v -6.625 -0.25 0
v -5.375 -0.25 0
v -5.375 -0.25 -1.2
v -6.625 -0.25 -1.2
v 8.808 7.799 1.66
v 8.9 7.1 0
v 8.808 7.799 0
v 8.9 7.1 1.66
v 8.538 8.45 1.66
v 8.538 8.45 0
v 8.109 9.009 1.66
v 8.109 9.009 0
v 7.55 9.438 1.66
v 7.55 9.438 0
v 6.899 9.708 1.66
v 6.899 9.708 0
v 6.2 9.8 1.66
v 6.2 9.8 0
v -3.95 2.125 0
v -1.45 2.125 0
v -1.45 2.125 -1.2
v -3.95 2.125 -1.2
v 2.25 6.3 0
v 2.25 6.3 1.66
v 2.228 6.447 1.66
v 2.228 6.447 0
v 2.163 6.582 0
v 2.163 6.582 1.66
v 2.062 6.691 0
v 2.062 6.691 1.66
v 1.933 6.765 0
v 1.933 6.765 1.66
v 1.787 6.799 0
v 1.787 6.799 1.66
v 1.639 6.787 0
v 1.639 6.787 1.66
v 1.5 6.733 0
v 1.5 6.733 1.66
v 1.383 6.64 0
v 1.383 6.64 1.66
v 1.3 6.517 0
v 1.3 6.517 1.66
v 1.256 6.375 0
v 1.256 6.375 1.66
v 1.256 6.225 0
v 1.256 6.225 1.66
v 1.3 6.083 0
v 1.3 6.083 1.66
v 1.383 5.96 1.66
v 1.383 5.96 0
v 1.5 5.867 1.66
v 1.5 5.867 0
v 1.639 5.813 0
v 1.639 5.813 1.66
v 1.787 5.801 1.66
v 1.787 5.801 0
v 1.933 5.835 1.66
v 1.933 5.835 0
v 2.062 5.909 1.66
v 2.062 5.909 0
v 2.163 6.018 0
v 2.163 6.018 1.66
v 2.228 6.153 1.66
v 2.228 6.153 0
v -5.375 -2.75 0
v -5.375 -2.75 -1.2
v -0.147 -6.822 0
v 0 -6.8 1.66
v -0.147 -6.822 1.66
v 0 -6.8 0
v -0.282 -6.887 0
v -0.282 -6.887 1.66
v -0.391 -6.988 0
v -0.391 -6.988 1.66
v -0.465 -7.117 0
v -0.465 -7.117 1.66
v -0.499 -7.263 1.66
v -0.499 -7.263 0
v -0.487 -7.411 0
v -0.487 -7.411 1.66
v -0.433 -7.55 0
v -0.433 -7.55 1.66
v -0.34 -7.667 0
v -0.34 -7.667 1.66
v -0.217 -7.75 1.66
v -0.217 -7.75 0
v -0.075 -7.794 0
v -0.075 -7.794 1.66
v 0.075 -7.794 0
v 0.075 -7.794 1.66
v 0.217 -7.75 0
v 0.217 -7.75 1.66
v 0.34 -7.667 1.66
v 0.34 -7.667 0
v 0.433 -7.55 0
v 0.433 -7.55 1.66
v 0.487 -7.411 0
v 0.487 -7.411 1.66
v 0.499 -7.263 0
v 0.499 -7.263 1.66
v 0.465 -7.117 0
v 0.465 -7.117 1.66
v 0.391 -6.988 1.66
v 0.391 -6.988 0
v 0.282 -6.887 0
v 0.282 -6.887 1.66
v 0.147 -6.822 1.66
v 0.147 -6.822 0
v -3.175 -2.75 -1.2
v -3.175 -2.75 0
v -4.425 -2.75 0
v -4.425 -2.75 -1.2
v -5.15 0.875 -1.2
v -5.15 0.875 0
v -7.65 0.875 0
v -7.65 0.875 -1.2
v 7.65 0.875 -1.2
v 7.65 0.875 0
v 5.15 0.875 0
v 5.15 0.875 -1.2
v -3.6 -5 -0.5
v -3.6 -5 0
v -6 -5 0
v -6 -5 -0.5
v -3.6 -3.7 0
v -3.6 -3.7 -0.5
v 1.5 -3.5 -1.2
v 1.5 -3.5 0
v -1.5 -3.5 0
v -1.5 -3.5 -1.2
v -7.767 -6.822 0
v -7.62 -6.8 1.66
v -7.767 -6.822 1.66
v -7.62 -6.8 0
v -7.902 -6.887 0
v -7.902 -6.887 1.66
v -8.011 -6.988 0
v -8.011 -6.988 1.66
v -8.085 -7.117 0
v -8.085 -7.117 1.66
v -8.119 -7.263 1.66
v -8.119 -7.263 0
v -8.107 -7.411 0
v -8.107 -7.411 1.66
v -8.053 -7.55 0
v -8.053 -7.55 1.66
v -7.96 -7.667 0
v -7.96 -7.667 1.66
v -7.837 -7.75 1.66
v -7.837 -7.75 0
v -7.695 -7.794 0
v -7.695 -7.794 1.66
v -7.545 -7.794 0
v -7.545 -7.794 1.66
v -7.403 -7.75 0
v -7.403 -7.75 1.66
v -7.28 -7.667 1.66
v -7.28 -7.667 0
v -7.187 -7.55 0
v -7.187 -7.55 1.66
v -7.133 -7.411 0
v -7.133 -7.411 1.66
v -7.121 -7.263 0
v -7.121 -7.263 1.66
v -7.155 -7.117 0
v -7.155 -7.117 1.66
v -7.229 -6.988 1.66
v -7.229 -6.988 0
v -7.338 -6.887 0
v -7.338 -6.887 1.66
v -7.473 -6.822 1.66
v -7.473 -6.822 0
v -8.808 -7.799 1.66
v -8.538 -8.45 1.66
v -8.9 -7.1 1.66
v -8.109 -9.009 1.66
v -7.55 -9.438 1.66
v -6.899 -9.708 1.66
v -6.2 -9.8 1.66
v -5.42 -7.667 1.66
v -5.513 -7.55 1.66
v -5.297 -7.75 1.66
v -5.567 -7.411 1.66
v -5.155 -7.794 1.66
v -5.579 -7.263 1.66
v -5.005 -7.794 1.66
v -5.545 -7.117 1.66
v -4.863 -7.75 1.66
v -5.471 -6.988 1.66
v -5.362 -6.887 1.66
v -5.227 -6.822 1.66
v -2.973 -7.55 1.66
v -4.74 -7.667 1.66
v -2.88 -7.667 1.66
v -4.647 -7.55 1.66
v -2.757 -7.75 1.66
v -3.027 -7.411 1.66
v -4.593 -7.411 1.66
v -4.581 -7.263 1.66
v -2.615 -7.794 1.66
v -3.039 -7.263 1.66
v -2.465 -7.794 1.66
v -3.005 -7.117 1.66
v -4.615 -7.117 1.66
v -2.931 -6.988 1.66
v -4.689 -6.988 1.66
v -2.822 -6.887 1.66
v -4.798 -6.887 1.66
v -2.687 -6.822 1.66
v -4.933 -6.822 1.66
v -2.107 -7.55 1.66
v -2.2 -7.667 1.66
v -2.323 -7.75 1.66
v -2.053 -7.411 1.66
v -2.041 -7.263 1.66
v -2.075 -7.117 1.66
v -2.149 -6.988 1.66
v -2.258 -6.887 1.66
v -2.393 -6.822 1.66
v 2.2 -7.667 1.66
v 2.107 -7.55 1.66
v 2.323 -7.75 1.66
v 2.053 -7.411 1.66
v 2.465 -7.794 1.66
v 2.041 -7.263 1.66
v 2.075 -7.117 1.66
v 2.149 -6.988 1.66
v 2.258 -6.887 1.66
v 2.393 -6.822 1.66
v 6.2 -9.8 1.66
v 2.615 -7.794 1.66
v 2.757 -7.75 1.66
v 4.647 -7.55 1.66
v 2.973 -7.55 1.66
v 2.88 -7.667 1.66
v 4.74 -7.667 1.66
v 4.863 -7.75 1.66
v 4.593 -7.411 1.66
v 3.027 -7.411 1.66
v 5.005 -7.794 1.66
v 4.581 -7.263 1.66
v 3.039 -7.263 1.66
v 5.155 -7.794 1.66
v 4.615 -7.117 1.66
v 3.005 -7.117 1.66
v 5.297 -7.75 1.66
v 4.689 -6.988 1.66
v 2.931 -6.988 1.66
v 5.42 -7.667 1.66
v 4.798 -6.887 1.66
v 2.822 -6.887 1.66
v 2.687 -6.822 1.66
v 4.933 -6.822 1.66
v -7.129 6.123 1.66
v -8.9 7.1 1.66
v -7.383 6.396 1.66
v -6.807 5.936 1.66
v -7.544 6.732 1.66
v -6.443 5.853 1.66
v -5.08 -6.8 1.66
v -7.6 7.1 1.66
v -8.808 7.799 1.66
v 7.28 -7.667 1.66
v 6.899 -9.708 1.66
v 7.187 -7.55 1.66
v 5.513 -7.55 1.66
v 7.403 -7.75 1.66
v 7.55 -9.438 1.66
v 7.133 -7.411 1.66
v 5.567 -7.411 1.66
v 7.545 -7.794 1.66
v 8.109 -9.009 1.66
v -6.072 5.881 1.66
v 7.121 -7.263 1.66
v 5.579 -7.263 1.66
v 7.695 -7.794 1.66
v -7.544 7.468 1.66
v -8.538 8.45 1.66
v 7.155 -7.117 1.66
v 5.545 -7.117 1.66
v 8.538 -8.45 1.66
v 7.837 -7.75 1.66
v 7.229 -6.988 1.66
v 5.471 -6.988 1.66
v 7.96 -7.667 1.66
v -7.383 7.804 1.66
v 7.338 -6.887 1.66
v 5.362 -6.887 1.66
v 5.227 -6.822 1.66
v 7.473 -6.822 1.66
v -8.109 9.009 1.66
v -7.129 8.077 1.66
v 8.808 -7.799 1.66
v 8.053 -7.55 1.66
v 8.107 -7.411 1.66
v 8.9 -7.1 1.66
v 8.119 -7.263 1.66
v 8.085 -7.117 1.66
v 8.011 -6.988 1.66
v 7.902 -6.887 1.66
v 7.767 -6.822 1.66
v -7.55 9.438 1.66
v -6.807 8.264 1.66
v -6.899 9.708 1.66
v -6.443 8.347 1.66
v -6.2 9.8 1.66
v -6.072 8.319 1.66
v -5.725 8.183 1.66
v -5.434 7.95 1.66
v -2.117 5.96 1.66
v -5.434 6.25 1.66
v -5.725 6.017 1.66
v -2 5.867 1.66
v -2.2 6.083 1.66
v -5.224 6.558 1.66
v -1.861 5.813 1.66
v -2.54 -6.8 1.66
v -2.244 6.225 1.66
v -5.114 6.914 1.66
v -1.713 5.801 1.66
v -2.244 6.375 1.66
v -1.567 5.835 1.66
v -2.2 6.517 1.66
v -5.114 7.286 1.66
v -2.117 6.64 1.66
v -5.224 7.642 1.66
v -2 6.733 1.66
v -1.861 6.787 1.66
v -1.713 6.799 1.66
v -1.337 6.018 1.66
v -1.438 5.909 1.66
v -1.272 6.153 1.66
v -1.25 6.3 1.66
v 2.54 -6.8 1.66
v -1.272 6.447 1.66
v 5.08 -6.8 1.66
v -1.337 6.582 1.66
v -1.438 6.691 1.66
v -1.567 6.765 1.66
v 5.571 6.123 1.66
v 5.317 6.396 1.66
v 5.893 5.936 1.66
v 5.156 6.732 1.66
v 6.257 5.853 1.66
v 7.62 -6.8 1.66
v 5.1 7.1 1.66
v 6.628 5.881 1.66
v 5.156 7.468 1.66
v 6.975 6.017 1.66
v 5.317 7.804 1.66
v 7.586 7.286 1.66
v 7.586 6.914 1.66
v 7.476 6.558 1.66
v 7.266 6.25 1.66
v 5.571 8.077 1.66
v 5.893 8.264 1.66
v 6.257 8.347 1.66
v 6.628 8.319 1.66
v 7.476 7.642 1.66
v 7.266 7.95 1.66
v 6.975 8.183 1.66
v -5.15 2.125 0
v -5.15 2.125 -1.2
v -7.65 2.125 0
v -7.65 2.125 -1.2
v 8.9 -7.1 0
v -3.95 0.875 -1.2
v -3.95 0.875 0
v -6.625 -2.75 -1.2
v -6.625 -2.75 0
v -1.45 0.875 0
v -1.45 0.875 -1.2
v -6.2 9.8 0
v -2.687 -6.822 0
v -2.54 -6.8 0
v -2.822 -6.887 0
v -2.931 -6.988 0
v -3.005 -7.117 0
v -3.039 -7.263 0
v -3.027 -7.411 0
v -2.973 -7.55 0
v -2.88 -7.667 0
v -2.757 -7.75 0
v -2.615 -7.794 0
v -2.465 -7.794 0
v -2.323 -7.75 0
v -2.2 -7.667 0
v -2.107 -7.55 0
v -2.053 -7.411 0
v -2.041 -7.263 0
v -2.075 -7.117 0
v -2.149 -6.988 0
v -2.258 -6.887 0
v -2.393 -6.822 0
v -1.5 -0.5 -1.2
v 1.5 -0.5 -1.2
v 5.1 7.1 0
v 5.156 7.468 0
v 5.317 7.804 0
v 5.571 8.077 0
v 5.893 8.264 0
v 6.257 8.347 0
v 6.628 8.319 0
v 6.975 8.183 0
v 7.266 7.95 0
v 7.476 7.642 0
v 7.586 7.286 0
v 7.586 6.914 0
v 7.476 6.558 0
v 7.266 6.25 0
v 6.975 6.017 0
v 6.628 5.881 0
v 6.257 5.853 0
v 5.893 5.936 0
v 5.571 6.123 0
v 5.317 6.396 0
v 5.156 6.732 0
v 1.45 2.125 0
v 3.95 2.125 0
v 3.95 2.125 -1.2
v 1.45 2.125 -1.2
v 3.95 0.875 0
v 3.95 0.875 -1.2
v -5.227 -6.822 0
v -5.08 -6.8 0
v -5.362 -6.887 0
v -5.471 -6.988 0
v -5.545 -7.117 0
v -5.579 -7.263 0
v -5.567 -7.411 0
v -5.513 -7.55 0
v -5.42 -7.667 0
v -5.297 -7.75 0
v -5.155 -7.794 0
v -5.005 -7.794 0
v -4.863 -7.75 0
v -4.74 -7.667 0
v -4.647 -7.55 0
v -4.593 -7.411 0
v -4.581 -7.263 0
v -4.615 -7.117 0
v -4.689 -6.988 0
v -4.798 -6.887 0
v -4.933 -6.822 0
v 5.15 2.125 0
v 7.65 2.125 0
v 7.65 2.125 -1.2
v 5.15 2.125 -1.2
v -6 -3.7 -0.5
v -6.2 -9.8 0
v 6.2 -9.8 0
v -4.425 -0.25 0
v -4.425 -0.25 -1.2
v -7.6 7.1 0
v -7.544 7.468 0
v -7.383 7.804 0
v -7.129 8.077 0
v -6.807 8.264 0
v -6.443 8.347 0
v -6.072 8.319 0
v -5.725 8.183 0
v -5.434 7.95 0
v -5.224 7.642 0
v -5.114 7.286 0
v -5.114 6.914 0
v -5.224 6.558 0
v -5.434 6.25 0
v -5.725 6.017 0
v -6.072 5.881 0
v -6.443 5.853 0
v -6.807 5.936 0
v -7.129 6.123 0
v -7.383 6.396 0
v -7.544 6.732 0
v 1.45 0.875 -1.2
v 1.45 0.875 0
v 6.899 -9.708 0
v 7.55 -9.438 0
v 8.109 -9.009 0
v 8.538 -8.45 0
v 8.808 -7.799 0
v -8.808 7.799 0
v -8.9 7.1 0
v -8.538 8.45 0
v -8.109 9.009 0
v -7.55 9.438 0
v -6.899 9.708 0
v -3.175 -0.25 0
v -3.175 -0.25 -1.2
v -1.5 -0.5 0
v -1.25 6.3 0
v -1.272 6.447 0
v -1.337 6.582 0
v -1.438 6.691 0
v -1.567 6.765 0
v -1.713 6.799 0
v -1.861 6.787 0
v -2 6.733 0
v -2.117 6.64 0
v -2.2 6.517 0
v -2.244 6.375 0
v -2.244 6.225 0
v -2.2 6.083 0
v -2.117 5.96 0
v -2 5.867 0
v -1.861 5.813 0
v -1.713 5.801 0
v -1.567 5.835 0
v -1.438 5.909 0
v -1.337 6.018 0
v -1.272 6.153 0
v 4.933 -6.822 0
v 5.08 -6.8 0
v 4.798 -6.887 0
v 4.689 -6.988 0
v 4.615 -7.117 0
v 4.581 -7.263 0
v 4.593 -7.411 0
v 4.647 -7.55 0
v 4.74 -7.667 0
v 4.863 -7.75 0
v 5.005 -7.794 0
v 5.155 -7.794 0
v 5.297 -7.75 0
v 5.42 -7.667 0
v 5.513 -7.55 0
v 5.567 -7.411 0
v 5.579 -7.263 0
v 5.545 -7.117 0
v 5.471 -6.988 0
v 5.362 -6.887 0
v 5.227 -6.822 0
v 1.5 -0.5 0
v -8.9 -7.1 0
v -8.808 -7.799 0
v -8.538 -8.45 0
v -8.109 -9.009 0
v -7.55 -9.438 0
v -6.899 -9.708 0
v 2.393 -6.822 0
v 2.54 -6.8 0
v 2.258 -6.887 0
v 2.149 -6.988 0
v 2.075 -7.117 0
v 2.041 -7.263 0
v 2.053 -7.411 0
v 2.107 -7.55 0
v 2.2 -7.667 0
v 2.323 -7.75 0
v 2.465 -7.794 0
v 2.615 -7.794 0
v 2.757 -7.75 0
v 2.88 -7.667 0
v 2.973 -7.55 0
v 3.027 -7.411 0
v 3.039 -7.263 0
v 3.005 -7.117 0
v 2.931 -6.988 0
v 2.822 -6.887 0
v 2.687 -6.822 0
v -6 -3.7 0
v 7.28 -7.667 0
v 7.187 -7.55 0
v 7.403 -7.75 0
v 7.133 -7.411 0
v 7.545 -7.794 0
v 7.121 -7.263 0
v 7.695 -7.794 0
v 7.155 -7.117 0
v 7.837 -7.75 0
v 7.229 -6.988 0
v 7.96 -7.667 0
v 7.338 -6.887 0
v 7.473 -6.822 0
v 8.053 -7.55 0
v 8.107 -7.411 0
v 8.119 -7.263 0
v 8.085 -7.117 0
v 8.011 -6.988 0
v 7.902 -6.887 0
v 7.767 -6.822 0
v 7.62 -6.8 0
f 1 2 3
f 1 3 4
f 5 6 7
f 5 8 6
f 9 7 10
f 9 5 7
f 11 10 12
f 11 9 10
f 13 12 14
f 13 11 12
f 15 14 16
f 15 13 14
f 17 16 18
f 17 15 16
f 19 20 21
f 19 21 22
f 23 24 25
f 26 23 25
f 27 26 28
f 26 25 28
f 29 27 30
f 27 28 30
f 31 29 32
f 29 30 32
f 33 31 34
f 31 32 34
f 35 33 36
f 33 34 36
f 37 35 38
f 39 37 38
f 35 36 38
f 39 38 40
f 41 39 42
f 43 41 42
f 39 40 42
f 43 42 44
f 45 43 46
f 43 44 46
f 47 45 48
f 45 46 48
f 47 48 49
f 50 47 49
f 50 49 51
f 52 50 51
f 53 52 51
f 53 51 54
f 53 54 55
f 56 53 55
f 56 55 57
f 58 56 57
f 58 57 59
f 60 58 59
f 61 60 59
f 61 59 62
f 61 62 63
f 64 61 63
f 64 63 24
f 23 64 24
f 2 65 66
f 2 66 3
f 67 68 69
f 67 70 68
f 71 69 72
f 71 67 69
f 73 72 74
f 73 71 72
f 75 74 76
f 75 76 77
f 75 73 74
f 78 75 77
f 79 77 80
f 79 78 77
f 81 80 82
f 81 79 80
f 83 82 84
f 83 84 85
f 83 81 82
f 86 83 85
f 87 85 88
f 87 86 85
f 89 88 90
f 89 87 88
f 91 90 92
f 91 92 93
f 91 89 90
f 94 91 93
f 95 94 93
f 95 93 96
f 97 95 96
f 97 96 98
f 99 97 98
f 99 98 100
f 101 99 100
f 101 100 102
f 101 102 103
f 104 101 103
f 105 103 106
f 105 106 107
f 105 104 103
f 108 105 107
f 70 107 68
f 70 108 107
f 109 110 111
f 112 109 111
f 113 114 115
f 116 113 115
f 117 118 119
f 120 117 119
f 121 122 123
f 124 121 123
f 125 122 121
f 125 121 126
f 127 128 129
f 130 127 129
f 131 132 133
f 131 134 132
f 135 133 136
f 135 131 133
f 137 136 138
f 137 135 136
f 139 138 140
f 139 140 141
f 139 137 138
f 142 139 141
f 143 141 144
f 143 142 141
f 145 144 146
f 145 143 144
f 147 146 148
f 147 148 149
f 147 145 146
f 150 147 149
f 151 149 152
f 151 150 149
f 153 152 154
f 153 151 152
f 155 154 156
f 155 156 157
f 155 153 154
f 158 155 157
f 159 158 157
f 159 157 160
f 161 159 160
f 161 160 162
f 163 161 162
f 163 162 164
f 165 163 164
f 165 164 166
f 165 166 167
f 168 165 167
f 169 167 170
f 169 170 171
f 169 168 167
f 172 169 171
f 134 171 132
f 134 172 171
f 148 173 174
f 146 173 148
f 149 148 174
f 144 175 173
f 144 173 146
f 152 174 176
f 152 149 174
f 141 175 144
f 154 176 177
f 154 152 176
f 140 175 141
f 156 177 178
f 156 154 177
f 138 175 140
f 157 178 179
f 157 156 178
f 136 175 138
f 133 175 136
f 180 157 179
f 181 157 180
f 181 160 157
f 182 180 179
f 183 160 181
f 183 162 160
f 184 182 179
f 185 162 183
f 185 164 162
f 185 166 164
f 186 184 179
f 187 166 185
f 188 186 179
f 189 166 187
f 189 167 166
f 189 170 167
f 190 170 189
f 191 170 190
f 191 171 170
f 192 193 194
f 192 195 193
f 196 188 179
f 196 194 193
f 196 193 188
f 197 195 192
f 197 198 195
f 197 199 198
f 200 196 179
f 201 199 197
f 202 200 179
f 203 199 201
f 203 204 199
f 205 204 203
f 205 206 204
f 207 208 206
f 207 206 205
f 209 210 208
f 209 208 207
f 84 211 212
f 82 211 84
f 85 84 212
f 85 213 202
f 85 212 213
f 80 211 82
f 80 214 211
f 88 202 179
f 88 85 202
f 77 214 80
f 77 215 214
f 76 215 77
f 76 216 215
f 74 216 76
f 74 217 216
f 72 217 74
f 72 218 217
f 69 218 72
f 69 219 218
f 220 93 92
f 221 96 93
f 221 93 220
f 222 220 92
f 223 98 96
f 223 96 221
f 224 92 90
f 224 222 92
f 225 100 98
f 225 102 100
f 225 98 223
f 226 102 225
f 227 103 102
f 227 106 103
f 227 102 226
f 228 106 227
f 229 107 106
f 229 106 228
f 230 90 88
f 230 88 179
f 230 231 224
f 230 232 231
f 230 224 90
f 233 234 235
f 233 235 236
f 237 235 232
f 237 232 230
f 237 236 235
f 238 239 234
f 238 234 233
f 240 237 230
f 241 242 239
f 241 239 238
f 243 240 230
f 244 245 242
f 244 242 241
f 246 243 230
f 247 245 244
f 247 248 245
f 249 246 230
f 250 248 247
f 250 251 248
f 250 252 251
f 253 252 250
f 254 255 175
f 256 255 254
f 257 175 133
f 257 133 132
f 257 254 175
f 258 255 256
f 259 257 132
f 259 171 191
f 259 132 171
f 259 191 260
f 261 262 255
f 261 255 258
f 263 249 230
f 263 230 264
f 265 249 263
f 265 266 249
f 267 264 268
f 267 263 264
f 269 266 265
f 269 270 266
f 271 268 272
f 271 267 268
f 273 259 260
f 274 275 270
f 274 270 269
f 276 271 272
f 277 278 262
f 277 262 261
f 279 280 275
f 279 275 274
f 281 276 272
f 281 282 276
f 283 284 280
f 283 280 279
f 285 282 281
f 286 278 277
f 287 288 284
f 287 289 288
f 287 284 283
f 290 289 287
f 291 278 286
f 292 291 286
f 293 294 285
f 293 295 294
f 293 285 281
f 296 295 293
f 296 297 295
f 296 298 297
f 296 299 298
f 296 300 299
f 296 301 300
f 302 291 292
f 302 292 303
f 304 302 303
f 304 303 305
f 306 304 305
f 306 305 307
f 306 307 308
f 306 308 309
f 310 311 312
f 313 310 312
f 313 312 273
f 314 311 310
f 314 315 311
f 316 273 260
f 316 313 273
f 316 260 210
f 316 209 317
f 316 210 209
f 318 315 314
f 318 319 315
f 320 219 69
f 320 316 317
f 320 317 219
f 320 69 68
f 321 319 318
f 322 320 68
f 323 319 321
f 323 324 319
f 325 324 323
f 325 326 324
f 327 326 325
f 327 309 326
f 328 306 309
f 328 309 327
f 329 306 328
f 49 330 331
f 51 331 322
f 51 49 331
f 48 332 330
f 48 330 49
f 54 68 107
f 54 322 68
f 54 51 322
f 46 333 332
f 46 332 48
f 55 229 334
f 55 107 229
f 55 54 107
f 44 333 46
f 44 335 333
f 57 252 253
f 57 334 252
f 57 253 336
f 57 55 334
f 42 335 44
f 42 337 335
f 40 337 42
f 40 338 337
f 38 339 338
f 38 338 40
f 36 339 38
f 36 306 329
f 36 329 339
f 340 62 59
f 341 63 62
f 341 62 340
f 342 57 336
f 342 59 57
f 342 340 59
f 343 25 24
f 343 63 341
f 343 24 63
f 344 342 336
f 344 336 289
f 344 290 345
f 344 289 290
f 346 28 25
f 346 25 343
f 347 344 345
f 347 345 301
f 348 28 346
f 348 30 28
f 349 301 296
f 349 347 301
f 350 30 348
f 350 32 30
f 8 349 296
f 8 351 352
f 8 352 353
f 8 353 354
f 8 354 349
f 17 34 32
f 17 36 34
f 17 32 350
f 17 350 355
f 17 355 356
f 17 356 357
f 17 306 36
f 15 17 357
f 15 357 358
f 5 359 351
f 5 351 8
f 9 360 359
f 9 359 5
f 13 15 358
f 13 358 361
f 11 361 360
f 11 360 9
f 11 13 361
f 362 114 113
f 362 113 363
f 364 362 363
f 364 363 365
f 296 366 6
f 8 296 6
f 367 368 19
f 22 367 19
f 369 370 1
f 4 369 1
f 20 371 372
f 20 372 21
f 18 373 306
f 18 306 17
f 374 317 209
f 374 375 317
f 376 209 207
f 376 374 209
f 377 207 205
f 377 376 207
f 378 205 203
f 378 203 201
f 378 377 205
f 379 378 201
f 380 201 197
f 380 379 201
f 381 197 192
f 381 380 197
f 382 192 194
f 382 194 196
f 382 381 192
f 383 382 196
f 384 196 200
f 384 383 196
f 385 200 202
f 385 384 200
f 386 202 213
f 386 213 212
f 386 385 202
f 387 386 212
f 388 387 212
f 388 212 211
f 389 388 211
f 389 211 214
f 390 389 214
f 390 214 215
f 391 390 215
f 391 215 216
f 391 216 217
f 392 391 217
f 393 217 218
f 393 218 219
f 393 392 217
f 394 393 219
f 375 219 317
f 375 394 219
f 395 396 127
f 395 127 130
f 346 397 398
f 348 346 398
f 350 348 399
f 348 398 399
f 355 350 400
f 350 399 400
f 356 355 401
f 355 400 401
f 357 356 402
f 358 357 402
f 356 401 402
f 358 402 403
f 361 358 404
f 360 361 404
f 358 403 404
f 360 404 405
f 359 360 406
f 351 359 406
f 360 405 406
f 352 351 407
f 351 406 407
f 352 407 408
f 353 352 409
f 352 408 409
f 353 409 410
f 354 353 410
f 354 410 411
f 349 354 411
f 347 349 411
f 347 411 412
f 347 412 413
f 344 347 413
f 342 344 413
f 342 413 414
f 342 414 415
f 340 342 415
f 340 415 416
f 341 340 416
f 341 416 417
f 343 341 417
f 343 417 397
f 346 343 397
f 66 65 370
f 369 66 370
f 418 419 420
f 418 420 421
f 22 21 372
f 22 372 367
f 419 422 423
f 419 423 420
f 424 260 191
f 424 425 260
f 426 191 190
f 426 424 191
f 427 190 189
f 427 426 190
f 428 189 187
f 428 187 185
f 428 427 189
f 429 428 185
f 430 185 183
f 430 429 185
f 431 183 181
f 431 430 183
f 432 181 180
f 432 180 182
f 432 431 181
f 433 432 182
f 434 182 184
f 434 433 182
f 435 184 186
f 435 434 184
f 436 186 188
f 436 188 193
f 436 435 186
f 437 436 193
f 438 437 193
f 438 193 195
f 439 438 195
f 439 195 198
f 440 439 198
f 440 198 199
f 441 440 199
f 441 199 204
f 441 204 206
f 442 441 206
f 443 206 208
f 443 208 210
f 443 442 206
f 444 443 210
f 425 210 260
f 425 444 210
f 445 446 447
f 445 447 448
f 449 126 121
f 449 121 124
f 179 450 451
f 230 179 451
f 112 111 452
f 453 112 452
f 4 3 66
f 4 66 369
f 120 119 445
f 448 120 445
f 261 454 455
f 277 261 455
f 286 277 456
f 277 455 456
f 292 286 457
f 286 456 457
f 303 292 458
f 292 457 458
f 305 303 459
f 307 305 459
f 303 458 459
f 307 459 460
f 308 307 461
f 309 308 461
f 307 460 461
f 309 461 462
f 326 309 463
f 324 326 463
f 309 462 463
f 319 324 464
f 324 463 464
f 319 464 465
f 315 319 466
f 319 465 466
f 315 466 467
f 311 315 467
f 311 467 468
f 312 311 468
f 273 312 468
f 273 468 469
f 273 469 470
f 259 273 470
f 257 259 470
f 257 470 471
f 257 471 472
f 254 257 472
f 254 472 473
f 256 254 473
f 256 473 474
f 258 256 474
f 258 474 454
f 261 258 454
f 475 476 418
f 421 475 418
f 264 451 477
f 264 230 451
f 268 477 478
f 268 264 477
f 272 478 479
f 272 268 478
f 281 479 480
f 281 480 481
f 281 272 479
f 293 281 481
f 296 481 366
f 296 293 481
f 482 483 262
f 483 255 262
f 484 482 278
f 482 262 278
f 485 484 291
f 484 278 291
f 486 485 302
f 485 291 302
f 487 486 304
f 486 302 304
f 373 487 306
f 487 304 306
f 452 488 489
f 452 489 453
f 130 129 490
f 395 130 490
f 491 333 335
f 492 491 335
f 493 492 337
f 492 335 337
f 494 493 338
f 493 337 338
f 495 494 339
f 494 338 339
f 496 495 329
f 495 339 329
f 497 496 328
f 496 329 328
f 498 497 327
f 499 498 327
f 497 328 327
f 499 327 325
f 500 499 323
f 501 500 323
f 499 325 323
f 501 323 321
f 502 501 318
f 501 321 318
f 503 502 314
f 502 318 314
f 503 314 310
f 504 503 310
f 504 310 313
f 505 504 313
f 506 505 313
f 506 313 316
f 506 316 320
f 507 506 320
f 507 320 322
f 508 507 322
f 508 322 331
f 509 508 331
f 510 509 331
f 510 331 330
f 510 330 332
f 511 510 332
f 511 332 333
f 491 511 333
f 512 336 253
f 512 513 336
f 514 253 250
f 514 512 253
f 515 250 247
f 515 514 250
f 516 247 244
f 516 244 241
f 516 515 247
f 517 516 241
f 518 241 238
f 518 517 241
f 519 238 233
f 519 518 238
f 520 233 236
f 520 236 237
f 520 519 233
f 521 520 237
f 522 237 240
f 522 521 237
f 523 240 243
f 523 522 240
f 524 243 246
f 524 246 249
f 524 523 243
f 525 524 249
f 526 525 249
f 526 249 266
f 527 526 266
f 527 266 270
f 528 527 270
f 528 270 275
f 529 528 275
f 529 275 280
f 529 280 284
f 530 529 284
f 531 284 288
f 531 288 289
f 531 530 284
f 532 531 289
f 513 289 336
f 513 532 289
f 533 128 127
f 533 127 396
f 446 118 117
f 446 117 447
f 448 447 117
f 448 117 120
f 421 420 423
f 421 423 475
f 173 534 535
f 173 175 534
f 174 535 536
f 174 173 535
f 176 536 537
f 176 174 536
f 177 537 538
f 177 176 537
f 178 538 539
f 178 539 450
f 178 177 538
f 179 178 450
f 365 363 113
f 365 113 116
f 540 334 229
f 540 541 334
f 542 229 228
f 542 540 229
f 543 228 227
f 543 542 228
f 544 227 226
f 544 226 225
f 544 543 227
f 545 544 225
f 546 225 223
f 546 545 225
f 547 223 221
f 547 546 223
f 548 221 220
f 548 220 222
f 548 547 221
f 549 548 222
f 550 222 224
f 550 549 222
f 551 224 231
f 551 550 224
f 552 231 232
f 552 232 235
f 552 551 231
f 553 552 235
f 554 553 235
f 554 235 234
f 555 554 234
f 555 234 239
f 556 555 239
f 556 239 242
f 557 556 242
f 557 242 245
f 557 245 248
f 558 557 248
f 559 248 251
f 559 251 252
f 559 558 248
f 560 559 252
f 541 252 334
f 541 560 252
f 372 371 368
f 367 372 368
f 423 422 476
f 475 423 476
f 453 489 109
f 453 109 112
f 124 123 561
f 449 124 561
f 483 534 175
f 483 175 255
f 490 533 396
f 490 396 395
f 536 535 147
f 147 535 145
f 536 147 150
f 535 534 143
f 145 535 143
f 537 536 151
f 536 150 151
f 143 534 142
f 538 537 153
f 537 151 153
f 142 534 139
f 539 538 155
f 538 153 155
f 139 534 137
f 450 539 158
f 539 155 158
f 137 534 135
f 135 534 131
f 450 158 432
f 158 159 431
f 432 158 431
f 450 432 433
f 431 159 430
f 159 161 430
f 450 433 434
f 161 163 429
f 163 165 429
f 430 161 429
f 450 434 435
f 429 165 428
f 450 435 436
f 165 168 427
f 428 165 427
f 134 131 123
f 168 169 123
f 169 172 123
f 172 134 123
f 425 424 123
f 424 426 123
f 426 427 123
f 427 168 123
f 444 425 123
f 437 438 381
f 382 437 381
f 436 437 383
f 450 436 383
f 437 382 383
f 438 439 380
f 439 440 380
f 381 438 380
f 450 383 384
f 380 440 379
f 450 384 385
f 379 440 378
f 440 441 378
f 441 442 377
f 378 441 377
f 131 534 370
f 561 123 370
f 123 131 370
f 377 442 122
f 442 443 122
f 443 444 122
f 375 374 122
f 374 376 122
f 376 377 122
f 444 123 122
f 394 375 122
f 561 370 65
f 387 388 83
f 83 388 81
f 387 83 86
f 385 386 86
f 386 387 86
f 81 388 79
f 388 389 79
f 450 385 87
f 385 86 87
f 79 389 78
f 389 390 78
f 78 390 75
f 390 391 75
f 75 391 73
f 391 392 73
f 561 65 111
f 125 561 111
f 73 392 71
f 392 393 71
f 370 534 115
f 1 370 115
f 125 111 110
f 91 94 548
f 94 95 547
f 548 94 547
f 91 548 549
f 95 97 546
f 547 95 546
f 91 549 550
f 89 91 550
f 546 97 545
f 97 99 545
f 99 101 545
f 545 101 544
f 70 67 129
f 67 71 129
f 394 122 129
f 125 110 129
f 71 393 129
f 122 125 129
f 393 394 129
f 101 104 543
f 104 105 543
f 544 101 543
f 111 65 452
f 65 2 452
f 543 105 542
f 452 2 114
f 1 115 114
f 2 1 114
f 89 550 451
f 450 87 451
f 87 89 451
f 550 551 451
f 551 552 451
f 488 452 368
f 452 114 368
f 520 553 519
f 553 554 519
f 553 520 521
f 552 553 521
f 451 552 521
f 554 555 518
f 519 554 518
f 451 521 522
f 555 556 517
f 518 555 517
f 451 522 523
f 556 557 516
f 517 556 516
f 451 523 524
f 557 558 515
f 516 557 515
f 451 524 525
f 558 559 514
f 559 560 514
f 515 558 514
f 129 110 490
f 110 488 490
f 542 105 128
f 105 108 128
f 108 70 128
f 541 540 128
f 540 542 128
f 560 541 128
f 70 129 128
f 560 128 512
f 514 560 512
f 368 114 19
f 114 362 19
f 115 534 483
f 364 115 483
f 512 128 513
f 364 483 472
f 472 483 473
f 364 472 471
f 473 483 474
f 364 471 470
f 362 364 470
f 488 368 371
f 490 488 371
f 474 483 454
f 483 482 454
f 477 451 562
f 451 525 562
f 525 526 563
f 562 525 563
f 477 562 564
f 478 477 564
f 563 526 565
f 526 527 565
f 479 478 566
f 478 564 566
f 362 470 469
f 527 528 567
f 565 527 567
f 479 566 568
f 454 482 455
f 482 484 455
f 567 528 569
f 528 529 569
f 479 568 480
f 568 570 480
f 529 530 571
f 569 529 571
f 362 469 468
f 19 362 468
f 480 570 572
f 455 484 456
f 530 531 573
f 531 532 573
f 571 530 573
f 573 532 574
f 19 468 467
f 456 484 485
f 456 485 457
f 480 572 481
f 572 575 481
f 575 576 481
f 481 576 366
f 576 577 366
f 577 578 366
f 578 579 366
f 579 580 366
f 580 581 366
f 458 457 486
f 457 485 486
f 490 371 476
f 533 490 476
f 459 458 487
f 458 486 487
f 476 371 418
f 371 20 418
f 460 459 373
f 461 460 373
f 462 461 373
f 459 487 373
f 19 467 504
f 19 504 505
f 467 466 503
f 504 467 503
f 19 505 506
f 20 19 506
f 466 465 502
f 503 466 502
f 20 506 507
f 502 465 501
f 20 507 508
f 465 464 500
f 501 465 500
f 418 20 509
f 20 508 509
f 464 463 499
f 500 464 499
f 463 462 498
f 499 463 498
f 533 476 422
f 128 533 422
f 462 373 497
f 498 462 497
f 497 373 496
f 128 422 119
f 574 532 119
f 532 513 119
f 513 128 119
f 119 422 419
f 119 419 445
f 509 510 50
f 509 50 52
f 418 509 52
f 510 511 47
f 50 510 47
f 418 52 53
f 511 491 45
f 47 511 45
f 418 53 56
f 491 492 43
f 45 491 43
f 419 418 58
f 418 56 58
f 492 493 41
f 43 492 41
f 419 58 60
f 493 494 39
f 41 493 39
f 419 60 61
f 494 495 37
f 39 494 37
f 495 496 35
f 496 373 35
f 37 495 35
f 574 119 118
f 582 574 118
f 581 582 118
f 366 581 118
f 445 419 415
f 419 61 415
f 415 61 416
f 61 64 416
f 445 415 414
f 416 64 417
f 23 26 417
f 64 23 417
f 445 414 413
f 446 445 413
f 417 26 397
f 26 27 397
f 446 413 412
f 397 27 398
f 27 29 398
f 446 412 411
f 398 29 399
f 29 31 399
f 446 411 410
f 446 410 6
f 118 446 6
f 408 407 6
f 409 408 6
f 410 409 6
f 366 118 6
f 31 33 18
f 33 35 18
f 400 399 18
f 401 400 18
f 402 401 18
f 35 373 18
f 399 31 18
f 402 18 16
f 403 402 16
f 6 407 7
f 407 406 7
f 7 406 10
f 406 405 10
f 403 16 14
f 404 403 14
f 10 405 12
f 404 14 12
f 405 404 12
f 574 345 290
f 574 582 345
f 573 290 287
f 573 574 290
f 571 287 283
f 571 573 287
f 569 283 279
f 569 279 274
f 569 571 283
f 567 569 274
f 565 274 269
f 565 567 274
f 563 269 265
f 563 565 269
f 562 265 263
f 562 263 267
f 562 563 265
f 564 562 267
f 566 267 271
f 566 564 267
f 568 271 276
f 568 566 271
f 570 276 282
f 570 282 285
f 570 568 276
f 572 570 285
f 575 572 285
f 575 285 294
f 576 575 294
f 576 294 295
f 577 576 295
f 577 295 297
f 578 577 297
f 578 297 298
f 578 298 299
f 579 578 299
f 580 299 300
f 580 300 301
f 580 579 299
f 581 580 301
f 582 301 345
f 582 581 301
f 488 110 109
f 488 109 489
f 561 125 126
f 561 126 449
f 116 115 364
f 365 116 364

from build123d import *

# Parameters (mm, degrees)
SKETCH1_W                    = 17.8
SKETCH1_H                    = 19.6
BOSS_EXTRUDE1_DEPTH          = 1.66
FILLET1_R                    = 2.7
F_2_5_2_5_DIAMETER_HOLE1_D   = 2.5
F_1_0_1_DIAMETER_HOLE1_D     = 1
F_1_0_1_DIAMETER_HOLE1_DEPTH = 32
F_1_0_1_DIAMETER_HOLE1_TIP   = 0.30043031
LPATTERN1_COUNT              = 7
LPATTERN1_PITCH              = 2.54
SKETCH9_W                    = 3
SKETCH9_H                    = 3
BOSS_EXTRUDE2_DEPTH          = 1.2
SKETCH10_W                   = 2.5
SKETCH10_H                   = 1.25
SKETCH10_W_2                 = 1.25
SKETCH10_H_2                 = 2.5
BOSS_EXTRUDE3_DEPTH          = 1.2
SKETCH11_W                   = 2.4
SKETCH11_H                   = 1.3
BOSS_EXTRUDE4_DEPTH          = 0.5


with BuildPart() as part:
    # Sketch1 → Boss-Extrude1 (new body)
    with BuildSketch(Plane.XY):
        Rectangle(SKETCH1_W, SKETCH1_H)
    extrude(amount=BOSS_EXTRUDE1_DEPTH)

    # Fillet1
    fillet1_edges = [part.edges().sort_by_distance(p)[0] for p in [
        (-8.9, 9.8, 0.83),
        (8.9, 9.8, 0.83),
        (8.9, -9.8, 0.83),
        (-8.9, -9.8, 0.83),
    ]]
    fillet(fillet1_edges, radius=FILLET1_R)

    # Ø2.5 (2.5) Diameter Hole1 (through all)
    with Locations(Plane.XY.offset(1.66)):
        with Locations((-6.35, 7.1), (6.35, 7.1)):
            Hole(F_2_5_2_5_DIAMETER_HOLE1_D / 2)

    # Ø1.0 (1) Diameter Hole1
    with Locations(Plane(origin=(0, 0, 0), x_dir=(-1, 0, 0), z_dir=(0, 0, -1))):
        with Locations((-1.75, 6.3), (1.75, 6.3)):
            Hole(F_1_0_1_DIAMETER_HOLE1_D / 2, depth=F_1_0_1_DIAMETER_HOLE1_DEPTH)
            with Locations((0, 0, -(F_1_0_1_DIAMETER_HOLE1_DEPTH + F_1_0_1_DIAMETER_HOLE1_TIP / 2))):  # 118° drill point
                Cone(0, F_1_0_1_DIAMETER_HOLE1_D / 2, F_1_0_1_DIAMETER_HOLE1_TIP, mode=Mode.SUBTRACT)

    # Sketch7 → Ø1.0 (1) Diameter Hole2 (revolve, cut)
    with BuildSketch(Plane(origin=(7.62, -7.3, 0), x_dir=(0, 1, 0), z_dir=(1, 0, 0))):
        Polygon((0, 0), (0, 1.96043031), (0.5, 1.66), (0.5, 0), align=None)
    f_1_0_1_diameter_hole2 = revolve(axis=Axis((7.62, -7.3, -6.35), (0, 0, 1)), mode=Mode.SUBTRACT)

    # LPattern1: Ø1.0 (1) Diameter Hole2 ×7
    with Locations(*[(-i * LPATTERN1_PITCH, 0, 0) for i in range(1, LPATTERN1_COUNT)]):
        add(f_1_0_1_diameter_hole2, mode=Mode.SUBTRACT)

    # Sketch9 → Boss-Extrude2 (add)
    with BuildSketch(Plane(origin=(0, 0, 0), x_dir=(-1, 0, 0), z_dir=(0, 0, -1))):
        with Locations((0, -2)):
            Rectangle(SKETCH9_W, SKETCH9_H)
    extrude(amount=BOSS_EXTRUDE2_DEPTH)

    # Sketch10 → Boss-Extrude3 (add)
    with BuildSketch(Plane(origin=(0, 0, 0), x_dir=(-1, 0, 0), z_dir=(0, 0, -1))):
        with Locations((2.7, 1.5)):
            Rectangle(SKETCH10_W, SKETCH10_H)
        with Locations((-6.4, 1.5)):
            Rectangle(SKETCH10_W, SKETCH10_H)
        with Locations((-2.7, 1.5)):
            Rectangle(SKETCH10_W, SKETCH10_H)
        with Locations((6.4, 1.5)):
            Rectangle(SKETCH10_W, SKETCH10_H)
        with Locations((3.8, -1.5)):
            Rectangle(SKETCH10_W_2, SKETCH10_H_2)
        with Locations((6, -1.5)):
            Rectangle(SKETCH10_W_2, SKETCH10_H_2)
    extrude(amount=BOSS_EXTRUDE3_DEPTH)

    # Sketch11 → Boss-Extrude4 (add)
    with BuildSketch(Plane(origin=(0, 0, 0), x_dir=(-1, 0, 0), z_dir=(0, 0, -1))):
        with Locations((4.8, -4.35)):
            Rectangle(SKETCH11_W, SKETCH11_H)
    extrude(amount=BOSS_EXTRUDE4_DEPTH)


solid = part.part
